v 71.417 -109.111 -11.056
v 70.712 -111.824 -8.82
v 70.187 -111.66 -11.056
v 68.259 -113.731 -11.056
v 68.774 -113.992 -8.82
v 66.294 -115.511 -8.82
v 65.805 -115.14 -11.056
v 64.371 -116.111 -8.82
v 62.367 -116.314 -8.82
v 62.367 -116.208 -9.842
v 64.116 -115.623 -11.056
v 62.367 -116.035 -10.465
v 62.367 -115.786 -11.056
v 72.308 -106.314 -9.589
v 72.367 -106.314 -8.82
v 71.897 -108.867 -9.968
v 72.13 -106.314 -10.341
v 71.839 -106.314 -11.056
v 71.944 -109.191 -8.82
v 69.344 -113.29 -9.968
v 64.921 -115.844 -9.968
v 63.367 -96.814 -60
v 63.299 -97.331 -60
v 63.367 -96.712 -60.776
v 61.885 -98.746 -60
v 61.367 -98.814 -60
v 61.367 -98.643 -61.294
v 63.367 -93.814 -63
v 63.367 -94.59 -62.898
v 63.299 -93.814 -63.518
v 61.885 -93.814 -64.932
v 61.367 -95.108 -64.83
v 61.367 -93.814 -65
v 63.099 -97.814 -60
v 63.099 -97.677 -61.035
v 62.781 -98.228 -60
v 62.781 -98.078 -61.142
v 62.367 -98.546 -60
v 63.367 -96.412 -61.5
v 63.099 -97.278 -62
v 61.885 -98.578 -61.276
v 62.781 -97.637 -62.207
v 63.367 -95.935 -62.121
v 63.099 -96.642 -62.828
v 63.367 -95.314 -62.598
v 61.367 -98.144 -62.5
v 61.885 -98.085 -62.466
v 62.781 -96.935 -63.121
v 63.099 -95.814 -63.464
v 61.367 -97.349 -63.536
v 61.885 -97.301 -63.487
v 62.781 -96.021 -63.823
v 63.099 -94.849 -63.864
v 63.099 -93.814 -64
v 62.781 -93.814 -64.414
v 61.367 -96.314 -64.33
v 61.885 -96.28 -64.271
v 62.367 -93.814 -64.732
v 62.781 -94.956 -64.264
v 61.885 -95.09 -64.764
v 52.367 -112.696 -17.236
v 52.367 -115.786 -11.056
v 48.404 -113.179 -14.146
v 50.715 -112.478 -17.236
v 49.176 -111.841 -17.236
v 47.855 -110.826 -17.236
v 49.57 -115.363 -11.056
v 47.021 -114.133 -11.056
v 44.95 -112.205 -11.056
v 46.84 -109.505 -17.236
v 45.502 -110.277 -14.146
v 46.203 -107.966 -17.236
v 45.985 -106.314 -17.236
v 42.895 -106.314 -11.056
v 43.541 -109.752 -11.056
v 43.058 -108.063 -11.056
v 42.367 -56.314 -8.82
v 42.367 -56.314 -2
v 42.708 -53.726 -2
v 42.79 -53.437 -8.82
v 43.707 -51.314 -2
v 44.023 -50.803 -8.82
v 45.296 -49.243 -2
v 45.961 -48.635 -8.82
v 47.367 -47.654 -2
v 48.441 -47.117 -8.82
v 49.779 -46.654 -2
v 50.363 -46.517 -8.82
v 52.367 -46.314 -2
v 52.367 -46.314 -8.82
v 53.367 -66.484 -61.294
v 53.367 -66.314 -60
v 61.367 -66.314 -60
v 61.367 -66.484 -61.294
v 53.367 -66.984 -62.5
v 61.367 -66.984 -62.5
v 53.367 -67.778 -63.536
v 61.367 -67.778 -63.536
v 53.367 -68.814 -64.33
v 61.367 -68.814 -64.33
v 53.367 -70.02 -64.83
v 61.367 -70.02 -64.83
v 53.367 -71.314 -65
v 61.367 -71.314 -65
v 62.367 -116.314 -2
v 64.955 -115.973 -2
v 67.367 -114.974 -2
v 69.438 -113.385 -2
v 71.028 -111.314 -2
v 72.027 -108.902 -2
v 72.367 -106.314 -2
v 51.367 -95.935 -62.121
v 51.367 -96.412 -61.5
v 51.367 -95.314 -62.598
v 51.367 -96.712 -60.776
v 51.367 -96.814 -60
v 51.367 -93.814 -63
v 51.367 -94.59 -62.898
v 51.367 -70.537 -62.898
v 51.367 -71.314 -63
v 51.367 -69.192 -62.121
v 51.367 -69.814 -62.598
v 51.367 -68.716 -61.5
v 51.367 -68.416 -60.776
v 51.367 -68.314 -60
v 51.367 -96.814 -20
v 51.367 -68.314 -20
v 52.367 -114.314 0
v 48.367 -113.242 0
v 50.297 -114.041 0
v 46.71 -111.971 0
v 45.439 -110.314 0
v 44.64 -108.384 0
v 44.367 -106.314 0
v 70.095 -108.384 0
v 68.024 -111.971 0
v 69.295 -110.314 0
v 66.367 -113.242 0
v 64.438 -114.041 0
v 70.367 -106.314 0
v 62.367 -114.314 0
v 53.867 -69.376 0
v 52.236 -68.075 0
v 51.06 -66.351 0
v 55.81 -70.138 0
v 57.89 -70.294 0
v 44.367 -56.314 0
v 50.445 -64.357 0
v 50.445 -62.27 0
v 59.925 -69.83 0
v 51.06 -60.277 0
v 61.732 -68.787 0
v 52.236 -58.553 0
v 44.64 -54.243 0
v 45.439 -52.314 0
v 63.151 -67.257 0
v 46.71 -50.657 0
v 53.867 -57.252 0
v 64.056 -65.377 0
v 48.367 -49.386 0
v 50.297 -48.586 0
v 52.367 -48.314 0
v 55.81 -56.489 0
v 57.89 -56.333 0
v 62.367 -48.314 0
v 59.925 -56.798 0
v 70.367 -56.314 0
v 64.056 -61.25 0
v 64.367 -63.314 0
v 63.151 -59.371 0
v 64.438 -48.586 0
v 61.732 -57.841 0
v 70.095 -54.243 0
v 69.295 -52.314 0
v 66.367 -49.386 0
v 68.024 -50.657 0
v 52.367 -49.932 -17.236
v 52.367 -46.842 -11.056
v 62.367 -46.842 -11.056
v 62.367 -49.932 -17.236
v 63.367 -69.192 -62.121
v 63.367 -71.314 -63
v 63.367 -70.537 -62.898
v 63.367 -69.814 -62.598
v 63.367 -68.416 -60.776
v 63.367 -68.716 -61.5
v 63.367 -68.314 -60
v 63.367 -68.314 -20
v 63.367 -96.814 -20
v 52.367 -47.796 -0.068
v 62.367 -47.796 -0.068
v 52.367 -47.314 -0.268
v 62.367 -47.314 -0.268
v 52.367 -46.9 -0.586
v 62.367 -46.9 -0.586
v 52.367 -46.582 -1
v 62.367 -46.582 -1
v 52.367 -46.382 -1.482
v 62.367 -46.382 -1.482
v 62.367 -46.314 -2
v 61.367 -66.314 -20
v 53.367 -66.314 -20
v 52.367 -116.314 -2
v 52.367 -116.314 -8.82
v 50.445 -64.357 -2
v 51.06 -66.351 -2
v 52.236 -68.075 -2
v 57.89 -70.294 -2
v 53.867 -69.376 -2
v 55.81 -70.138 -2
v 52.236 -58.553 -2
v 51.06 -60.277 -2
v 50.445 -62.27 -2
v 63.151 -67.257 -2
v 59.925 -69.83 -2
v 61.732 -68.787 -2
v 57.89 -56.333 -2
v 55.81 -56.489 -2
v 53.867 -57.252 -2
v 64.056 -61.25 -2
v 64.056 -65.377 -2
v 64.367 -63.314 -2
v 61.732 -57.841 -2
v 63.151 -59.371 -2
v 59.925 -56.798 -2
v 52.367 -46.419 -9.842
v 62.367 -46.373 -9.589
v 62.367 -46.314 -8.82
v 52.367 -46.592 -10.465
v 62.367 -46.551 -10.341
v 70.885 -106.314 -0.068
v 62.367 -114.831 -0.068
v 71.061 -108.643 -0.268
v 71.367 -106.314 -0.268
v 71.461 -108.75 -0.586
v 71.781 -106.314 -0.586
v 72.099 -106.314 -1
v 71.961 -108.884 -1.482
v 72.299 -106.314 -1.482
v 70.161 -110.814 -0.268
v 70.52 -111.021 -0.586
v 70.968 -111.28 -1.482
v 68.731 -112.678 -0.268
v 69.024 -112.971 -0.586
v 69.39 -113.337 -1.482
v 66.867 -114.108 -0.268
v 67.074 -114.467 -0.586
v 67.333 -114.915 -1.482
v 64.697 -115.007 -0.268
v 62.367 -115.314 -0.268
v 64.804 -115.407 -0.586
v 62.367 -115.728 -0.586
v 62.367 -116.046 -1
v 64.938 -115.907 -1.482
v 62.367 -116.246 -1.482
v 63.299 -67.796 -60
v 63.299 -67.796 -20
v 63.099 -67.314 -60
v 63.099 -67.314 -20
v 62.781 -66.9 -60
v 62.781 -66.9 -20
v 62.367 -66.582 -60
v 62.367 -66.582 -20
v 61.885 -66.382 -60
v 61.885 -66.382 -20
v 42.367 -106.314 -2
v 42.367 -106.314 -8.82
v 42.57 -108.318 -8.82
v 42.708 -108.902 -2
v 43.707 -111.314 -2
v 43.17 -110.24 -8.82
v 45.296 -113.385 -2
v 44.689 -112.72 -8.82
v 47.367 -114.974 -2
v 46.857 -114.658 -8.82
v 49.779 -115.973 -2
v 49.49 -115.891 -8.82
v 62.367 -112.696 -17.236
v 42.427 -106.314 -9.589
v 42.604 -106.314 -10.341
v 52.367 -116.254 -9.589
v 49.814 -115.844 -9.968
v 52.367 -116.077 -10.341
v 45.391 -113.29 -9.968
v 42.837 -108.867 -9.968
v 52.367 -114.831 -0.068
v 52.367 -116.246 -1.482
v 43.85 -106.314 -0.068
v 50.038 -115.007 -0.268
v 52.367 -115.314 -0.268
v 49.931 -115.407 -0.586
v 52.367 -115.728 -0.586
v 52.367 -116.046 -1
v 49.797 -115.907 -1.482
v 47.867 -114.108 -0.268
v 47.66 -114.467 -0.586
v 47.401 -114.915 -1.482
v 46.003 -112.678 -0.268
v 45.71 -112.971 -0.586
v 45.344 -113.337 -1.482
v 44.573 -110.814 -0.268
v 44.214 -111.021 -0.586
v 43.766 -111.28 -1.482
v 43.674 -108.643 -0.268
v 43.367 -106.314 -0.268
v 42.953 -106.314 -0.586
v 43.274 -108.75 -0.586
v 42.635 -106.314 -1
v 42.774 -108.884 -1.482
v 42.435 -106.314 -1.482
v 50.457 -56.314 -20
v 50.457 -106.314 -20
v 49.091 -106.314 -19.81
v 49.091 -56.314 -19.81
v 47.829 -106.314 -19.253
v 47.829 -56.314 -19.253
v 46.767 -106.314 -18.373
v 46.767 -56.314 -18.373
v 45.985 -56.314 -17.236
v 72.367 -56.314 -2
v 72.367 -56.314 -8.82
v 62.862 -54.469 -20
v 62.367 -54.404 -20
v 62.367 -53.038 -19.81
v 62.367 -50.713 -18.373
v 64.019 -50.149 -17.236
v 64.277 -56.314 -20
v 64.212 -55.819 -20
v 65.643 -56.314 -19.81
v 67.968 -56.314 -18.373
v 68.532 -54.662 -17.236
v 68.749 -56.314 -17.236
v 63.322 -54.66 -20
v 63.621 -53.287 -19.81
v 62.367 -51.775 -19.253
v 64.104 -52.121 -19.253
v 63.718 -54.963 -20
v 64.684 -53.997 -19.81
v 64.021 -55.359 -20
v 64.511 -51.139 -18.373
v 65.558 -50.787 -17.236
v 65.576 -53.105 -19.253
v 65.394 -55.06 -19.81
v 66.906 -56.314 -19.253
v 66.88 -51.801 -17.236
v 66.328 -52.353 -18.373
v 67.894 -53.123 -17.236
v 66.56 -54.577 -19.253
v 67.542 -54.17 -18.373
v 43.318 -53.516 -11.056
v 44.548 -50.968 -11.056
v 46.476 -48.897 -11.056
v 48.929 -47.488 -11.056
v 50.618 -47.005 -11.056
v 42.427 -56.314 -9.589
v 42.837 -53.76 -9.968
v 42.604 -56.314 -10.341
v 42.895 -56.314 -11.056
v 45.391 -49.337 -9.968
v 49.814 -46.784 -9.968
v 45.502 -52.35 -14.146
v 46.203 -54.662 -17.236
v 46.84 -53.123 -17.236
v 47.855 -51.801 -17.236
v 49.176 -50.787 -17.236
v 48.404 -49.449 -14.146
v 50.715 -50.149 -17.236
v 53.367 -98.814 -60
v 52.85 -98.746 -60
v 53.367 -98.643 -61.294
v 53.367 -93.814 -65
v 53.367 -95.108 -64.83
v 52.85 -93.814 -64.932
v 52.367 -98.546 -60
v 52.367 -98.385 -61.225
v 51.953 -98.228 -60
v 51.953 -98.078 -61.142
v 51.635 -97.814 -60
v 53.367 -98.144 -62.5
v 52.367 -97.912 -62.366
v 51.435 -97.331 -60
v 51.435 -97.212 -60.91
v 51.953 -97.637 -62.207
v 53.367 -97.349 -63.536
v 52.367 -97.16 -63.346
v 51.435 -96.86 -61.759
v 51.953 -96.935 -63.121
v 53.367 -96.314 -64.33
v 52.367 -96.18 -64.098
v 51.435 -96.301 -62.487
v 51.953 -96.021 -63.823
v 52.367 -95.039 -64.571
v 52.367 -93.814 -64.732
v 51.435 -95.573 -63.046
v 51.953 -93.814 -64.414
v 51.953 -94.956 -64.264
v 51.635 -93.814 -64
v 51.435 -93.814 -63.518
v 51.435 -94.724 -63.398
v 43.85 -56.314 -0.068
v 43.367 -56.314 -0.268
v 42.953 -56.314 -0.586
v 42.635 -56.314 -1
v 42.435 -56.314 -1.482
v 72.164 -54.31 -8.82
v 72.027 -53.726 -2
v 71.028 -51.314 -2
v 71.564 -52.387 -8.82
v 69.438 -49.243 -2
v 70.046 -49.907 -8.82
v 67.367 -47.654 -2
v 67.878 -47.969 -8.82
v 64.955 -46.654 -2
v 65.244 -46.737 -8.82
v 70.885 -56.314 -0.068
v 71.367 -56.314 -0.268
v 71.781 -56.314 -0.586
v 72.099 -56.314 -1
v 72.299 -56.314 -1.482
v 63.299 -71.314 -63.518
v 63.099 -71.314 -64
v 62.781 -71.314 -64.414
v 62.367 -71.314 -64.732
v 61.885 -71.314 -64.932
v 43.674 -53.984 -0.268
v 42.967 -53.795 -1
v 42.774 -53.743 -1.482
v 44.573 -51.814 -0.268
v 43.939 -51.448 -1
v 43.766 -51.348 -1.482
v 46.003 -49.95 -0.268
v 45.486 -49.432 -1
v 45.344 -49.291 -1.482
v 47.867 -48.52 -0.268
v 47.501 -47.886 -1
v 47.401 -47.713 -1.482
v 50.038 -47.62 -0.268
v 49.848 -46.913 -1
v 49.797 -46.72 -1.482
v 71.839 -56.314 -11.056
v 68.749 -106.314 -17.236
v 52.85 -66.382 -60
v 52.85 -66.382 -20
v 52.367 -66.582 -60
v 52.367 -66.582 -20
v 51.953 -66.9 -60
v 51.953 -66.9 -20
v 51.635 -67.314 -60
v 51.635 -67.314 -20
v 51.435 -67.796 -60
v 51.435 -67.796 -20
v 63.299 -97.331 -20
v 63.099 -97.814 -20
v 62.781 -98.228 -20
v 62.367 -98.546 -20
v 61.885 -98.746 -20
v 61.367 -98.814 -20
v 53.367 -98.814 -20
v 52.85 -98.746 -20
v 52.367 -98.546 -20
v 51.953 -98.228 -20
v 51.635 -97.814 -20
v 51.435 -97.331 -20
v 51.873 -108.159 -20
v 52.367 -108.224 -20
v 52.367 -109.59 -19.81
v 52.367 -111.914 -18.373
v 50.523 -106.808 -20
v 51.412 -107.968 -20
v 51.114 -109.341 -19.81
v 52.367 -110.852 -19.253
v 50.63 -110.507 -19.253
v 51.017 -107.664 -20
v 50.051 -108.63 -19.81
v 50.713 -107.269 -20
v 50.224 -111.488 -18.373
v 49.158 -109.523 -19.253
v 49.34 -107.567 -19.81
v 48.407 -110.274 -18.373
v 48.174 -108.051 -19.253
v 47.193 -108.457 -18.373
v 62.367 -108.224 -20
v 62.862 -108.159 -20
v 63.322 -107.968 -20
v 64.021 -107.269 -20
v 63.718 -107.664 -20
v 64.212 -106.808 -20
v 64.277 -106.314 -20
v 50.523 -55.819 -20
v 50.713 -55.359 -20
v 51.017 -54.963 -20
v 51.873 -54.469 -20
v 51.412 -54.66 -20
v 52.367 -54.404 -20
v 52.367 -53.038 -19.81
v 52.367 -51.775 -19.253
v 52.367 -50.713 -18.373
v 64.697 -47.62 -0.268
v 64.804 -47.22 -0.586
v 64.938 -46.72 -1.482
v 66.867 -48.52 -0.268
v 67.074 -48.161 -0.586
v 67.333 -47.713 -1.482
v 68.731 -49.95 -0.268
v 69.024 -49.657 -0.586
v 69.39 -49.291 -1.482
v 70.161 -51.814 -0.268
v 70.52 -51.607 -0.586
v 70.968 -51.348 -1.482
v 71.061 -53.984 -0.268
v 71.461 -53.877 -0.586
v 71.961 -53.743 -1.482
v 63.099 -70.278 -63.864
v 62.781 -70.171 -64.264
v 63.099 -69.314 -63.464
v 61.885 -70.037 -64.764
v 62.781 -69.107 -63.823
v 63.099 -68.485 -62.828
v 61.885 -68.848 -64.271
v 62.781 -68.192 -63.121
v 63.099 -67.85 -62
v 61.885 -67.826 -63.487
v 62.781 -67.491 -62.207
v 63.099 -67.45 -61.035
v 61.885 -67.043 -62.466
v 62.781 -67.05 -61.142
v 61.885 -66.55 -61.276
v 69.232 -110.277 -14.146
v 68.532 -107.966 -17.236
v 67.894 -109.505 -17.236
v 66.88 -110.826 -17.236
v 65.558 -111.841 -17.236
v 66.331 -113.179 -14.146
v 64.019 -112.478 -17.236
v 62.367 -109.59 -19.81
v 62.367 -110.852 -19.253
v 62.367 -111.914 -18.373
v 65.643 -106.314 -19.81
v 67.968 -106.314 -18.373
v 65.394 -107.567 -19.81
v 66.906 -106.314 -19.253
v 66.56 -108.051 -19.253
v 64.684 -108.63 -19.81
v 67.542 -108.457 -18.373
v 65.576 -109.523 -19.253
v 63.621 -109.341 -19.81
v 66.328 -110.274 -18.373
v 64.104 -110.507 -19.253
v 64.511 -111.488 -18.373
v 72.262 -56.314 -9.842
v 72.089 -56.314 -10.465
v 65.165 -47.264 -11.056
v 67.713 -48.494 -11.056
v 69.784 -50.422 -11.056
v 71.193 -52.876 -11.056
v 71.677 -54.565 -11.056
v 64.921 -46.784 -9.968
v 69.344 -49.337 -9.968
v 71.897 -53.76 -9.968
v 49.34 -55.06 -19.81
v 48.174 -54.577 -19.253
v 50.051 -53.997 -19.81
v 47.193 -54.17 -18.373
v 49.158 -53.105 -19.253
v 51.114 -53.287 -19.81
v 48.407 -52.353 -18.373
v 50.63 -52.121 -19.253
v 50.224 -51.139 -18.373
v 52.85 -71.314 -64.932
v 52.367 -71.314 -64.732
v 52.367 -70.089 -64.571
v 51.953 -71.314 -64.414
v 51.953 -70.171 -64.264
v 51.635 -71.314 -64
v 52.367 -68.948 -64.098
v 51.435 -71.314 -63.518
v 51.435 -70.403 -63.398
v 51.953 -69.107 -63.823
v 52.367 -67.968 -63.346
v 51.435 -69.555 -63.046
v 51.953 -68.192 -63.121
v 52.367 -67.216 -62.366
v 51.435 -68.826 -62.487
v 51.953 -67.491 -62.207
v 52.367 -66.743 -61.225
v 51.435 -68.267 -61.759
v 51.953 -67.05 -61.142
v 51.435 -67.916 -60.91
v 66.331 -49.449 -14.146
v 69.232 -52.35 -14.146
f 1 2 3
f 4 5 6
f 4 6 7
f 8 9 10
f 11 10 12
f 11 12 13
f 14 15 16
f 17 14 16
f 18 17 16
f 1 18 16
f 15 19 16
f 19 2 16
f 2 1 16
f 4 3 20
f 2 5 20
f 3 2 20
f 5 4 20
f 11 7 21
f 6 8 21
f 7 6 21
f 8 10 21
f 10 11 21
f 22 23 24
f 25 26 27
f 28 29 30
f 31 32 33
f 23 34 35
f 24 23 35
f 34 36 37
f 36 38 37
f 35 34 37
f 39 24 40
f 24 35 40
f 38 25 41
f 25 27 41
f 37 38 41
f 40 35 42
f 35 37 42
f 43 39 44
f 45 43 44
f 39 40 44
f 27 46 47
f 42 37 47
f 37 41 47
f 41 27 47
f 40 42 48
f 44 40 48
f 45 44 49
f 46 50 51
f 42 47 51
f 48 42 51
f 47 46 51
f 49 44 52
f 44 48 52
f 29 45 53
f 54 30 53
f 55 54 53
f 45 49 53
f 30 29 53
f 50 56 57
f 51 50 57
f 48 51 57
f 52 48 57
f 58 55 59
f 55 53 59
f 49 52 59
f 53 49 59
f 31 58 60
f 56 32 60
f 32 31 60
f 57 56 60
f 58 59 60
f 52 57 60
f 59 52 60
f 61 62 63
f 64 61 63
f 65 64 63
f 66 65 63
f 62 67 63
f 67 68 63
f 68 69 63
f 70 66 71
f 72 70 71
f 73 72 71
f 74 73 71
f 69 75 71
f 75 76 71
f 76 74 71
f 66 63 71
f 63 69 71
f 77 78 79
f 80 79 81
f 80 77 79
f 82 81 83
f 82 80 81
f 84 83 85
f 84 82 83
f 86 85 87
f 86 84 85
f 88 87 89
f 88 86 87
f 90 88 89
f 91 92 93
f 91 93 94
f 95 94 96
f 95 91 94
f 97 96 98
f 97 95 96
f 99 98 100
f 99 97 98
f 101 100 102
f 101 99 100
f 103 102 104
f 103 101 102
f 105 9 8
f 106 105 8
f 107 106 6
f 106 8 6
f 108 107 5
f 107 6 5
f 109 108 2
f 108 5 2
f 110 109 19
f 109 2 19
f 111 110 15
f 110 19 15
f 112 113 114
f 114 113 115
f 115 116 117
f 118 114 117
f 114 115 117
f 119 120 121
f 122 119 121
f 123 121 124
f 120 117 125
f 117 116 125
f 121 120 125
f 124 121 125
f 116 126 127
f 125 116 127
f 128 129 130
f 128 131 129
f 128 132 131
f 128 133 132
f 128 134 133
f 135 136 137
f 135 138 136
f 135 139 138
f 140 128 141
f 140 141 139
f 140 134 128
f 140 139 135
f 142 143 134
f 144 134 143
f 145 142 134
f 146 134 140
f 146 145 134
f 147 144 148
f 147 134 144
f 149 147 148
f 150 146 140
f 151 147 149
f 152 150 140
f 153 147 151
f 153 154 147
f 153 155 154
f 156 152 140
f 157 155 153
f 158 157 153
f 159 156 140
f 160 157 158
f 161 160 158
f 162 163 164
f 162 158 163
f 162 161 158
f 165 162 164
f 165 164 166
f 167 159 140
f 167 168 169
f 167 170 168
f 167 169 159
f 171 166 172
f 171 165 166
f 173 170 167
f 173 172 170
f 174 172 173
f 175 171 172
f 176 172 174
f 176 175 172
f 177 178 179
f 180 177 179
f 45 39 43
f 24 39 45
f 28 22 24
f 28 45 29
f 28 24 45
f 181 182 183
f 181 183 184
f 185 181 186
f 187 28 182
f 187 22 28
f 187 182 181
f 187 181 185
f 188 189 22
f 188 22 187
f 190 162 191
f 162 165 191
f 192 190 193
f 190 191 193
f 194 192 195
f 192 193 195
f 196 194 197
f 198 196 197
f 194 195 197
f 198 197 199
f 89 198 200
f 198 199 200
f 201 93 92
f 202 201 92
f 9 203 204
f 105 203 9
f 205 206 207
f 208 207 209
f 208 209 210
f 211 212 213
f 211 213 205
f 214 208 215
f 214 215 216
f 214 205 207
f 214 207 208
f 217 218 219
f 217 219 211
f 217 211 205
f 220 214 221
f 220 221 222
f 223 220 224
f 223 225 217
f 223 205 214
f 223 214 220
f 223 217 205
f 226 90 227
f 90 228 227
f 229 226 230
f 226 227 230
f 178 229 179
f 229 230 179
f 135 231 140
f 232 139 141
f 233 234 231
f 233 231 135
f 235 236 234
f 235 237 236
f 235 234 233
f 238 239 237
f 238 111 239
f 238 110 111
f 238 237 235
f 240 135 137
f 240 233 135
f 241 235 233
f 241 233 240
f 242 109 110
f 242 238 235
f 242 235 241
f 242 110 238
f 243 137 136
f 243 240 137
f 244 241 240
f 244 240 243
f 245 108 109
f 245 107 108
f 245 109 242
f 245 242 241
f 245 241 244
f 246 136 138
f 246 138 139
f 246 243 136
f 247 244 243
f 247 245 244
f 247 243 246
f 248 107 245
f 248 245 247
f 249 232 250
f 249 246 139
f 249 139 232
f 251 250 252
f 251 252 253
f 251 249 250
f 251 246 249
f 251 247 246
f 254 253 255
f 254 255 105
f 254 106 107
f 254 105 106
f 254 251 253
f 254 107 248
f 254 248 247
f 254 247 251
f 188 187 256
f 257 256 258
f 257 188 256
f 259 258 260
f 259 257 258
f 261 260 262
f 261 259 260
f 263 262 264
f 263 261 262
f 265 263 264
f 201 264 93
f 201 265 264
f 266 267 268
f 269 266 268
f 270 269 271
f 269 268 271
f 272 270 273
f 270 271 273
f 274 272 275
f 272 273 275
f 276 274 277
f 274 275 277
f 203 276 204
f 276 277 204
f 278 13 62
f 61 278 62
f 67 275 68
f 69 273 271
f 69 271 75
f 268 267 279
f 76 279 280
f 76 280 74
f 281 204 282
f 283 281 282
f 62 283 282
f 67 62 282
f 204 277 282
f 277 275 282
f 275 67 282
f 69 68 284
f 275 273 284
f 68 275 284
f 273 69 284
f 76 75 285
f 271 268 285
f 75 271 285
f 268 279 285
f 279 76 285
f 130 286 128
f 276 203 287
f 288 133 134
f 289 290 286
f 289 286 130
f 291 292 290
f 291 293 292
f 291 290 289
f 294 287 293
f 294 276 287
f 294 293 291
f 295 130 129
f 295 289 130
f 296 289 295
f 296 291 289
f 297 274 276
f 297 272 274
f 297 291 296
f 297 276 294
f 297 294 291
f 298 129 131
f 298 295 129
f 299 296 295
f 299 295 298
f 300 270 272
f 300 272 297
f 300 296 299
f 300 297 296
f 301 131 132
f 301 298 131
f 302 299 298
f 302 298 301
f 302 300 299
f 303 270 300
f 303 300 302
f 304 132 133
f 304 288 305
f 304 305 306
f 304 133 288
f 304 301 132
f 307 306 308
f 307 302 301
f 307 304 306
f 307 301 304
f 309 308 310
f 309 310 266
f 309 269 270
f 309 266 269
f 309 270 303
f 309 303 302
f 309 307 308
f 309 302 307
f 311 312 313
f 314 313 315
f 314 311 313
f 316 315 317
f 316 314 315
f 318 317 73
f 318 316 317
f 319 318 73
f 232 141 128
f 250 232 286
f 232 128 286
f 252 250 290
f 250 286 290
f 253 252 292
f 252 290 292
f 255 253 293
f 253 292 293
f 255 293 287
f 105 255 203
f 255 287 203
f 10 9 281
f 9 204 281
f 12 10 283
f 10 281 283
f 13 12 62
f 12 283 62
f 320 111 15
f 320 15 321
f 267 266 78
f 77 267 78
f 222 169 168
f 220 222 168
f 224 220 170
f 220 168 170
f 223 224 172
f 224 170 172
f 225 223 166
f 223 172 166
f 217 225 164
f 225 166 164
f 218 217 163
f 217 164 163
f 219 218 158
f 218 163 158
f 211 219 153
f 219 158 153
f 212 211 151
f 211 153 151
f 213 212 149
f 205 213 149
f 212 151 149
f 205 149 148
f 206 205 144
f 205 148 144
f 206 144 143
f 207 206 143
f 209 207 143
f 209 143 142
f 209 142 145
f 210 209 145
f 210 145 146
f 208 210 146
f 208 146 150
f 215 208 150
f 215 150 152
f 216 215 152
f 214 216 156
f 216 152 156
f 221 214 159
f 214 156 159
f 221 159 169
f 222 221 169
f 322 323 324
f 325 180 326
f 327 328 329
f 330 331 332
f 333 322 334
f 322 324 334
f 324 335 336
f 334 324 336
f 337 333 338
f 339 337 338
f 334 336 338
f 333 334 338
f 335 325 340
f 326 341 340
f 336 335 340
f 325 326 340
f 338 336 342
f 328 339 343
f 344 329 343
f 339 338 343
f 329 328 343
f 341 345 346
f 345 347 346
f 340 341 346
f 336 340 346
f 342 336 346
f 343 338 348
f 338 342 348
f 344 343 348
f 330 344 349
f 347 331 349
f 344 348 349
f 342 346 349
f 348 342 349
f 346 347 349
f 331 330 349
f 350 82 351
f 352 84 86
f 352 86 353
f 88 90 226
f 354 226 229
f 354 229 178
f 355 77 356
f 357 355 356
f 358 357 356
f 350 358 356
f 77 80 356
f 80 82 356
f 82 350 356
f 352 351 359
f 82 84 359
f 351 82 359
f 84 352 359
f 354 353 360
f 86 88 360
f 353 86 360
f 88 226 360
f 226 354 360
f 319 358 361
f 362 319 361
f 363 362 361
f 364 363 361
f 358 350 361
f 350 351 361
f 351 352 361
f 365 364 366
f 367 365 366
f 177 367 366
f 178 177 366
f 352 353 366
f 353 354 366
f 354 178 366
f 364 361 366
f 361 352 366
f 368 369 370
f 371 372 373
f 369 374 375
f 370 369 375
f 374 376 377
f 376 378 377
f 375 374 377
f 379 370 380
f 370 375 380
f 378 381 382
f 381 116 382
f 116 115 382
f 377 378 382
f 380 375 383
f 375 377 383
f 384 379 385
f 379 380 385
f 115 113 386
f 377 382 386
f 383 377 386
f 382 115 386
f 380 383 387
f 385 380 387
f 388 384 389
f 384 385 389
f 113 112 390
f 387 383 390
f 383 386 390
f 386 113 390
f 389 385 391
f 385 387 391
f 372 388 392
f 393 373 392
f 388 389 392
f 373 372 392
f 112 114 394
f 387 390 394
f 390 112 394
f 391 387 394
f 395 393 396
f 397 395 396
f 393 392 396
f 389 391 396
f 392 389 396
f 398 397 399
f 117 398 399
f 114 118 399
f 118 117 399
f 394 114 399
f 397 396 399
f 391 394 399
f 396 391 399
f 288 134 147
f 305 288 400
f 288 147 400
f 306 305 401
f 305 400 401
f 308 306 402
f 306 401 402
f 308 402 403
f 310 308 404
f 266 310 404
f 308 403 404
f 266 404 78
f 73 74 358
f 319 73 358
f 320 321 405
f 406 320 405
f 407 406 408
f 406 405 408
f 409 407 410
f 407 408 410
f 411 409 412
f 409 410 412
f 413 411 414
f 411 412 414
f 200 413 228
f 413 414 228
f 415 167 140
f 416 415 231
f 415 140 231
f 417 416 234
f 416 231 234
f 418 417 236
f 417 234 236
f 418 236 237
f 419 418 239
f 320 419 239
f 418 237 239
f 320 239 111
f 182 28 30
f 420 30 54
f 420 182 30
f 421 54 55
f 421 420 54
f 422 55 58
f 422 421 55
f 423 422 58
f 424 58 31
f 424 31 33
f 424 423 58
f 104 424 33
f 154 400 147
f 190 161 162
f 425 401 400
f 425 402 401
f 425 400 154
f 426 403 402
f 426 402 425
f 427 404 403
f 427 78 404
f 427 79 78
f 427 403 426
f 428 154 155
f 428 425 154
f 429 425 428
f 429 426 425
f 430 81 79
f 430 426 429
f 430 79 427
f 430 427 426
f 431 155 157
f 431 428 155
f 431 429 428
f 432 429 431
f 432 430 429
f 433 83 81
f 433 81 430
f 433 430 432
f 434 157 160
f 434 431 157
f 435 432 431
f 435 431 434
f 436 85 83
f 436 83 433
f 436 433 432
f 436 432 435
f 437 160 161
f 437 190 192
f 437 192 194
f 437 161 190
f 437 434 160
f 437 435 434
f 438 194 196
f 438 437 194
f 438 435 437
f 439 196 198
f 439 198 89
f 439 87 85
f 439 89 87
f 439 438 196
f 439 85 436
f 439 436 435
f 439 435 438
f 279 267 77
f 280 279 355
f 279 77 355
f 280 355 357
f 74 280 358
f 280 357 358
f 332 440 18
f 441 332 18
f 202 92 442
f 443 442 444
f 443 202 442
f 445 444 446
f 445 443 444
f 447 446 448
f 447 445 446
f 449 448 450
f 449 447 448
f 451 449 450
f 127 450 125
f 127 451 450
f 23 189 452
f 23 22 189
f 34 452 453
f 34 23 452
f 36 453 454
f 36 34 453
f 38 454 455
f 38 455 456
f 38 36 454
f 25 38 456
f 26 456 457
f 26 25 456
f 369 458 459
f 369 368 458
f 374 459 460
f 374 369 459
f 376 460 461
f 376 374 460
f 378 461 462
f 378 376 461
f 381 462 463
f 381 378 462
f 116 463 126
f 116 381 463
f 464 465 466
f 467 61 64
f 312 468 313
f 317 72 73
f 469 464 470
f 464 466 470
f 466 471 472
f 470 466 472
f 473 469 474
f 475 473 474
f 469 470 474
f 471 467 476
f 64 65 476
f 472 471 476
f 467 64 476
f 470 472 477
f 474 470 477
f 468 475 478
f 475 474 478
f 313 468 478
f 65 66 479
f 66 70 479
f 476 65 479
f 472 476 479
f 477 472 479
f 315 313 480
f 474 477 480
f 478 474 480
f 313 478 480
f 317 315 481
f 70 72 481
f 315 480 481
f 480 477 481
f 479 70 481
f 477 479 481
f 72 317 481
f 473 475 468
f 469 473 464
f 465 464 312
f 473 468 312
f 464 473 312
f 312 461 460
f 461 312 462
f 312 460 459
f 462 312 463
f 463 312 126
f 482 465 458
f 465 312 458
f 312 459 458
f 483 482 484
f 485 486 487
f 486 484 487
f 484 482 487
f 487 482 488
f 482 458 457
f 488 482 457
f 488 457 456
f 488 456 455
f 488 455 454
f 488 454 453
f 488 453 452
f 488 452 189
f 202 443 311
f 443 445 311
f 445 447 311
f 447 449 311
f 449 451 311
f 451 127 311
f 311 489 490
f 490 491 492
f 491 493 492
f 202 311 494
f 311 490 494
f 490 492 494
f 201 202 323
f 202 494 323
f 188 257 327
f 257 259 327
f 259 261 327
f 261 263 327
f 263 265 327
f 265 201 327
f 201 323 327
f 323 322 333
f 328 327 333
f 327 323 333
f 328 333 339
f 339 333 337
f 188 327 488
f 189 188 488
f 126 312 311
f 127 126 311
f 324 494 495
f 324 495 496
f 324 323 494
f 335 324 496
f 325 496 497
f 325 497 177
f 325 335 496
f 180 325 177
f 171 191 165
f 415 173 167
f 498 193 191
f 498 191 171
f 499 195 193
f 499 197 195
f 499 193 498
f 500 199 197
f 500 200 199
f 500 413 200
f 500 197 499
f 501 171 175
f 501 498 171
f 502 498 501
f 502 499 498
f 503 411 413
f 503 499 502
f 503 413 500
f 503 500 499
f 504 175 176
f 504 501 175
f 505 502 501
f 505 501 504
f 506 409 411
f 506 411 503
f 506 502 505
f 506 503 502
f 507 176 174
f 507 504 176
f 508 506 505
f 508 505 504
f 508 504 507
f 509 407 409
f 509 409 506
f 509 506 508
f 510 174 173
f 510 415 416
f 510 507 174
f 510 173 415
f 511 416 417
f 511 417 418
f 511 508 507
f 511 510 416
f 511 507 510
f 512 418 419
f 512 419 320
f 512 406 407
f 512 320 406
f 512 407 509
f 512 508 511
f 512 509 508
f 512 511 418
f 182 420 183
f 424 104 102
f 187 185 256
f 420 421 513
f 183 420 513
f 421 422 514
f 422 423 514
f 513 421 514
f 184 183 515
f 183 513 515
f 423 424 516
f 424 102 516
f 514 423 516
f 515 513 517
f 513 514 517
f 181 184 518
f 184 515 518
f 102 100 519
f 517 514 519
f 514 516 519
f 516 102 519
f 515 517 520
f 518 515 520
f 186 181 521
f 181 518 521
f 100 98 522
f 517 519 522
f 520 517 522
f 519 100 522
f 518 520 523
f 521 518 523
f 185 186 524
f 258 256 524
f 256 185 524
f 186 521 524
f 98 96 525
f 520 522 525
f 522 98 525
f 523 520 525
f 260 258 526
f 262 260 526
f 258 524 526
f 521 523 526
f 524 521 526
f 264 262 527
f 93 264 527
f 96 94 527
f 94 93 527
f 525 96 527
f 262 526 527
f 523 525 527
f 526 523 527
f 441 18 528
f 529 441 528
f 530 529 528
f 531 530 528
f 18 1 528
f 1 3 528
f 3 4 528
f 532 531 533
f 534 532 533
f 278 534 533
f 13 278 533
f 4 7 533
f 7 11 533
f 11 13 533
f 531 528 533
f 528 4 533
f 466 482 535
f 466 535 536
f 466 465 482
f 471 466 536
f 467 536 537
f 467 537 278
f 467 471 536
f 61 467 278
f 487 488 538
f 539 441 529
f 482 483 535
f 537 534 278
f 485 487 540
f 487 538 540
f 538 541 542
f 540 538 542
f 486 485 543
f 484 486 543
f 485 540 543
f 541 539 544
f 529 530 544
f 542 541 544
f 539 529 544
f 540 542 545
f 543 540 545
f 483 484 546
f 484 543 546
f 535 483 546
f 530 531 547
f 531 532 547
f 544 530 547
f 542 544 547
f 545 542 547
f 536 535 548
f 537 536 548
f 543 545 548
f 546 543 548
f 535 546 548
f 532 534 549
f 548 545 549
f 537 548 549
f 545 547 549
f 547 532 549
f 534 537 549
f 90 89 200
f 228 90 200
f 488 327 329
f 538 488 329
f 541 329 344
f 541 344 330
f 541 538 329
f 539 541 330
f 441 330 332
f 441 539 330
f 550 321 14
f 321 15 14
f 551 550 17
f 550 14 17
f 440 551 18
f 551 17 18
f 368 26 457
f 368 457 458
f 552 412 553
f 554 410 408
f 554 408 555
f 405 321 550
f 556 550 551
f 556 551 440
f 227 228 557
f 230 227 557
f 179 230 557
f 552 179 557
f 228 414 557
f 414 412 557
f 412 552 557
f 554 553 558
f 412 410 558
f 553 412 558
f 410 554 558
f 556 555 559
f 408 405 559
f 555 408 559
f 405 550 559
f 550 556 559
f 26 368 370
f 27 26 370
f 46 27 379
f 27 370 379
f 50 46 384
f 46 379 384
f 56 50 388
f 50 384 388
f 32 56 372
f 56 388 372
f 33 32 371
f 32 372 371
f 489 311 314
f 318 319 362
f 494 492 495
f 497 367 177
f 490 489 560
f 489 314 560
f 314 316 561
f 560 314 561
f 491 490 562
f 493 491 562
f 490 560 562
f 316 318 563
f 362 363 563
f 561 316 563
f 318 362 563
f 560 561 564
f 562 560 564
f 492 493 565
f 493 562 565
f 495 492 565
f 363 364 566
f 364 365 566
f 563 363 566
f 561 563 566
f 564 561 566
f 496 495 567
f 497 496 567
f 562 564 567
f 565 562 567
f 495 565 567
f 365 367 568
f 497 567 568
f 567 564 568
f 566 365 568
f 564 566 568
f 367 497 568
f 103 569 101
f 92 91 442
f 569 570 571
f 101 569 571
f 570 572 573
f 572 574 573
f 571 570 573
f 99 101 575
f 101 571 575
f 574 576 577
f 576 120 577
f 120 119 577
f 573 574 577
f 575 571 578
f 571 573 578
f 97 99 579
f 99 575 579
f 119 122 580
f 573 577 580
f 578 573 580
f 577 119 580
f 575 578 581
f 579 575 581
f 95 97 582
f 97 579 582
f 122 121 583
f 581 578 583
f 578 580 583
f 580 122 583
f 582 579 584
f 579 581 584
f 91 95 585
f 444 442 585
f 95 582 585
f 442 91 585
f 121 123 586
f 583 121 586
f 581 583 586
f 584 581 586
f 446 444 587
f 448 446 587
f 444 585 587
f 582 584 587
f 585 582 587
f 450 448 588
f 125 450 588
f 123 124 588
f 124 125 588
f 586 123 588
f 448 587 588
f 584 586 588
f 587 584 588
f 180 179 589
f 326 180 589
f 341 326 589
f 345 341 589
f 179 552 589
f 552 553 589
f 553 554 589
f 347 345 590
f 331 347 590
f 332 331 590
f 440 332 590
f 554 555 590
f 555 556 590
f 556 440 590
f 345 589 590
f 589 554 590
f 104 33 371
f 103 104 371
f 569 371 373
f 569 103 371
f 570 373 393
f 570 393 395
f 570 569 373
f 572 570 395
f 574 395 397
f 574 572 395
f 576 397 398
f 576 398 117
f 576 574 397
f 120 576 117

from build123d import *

# Parameters (mm, degrees)
SKETCH1_W           = 30
SKETCH1_H           = 70
BOSS_EXTRUDE1_DEPTH = 20
FILLET1_R           = 10
FILLET2_R           = 2
CHAMFER1_SIZE       = 5
CHAMFER1_SIZE2      = 10
FILLET3_R           = 5
SKETCH2_W           = 12
SKETCH2_H           = 32.5
BOSS_EXTRUDE2_DEPTH = 45
FILLET4_R           = 5
SKETCH3_R           = 7
CUT_EXTRUDE1_DEPTH  = 2
FILLET5_R           = 2


with BuildPart() as part:
    # Sketch1 → Boss-Extrude1 (new body)
    with BuildSketch(Plane.XY):
        with Locations((57.367254616, -81.313756287)):
            Rectangle(SKETCH1_W, SKETCH1_H)
    extrude(amount=-BOSS_EXTRUDE1_DEPTH)

    # Fillet1
    fillet1_edges = [part.edges().sort_by_distance(p)[0] for p in [
        (42.367254616, -46.313756287, -10),
        (72.367254616, -46.313756287, -10),
        (72.367254616, -116.313756287, -10),
        (42.367254616, -116.313756287, -10),
    ]]
    fillet(fillet1_edges, radius=FILLET1_R)

    # Fillet2
    fillet2_edges = [part.edges().sort_by_distance(p)[0] for p in [
        (57.367254616, -46.313756287, 0),
        (42.367254616, -81.313756287, 0),
        (57.367254616, -116.313756287, 0),
        (72.367254616, -81.313756287, 0),
        (69.438322428, -113.384824099, 0),
        (45.296186805, -113.384824099, 0),
        (69.438322428, -49.242688475, 0),
        (45.296186805, -49.242688475, 0),
    ]]
    fillet(fillet2_edges, radius=FILLET2_R)

    # Chamfer1
    chamfer1_edges = [part.edges().sort_by_distance(p)[0] for p in [
        (57.367254616, -46.313756287, -20),
        (42.367254616, -81.313756287, -20),
        (72.367254616, -81.313756287, -20),
        (57.367254616, -116.313756287, -20),
        (69.438322428, -113.384824099, -20),
        (45.296186805, -113.384824099, -20),
        (69.438322428, -49.242688475, -20),
        (45.296186805, -49.242688475, -20),
    ]]
    chamfer1_side = [part.faces().sort_by_distance(p)[0] for p in [
        (57.367254616, -81.313756287, -20),
    ]]
    chamfer(chamfer1_edges, length=CHAMFER1_SIZE, length2=CHAMFER1_SIZE2, reference=chamfer1_side[0])

    # Fillet3
    fillet3_edges = [part.edges().sort_by_distance(p)[0] for p in [
        (42.367254616, -81.313756287, -10),
        (67.367254616, -81.313756287, -20),
        (65.902788522, -52.778222381, -20),
        (65.902788522, -109.849290193, -20),
        (57.367254616, -51.313756287, -20),
        (57.367254616, -111.313756287, -20),
        (48.83172071, -52.778222381, -20),
        (48.83172071, -109.849290193, -20),
        (47.367254616, -81.313756287, -20),
        (45.296186805, -113.384824099, -10),
        (45.296186805, -49.242688475, -10),
        (57.367254616, -116.313756287, -10),
        (57.367254616, -46.313756287, -10),
        (69.438322428, -113.384824099, -10),
        (69.438322428, -49.242688475, -10),
        (72.367254616, -81.313756287, -10),
    ]]
    fillet(fillet3_edges, radius=FILLET3_R)

    # Sketch2 → Boss-Extrude2 (add)
    with BuildSketch(Plane(origin=(0, 0, -20), x_dir=(-1, 0, 0), z_dir=(0, 0, -1))):
        with Locations((-57.367254616, -82.563756287)):
            Rectangle(SKETCH2_W, SKETCH2_H)
    extrude(amount=BOSS_EXTRUDE2_DEPTH)

    # Fillet4
    fillet4_edges = [part.edges().sort_by_distance(p)[0] for p in [
        (57.367254616, -98.813756287, -65),
        (57.367254616, -66.313756287, -65),
    ]]
    fillet(fillet4_edges, radius=FILLET4_R)

    # Sketch3 → Cut-Extrude1 (cut)
    with BuildSketch(Plane.XY):
        with Locations((57.367254616, -63.313756287)):
            Circle(SKETCH3_R)
    extrude(amount=-CUT_EXTRUDE1_DEPTH, mode=Mode.SUBTRACT)

    # Fillet5
    fillet5_edges = [part.edges().sort_by_distance(p)[0] for p in [
        (63.367254616, -82.563756287, -65),
        (51.367254616, -82.563756287, -65),
        (63.367254616, -98.813756287, -40),
        (63.367254616, -66.313756287, -40),
        (63.367254616, -97.349290193, -63.535533906),
        (63.367254616, -67.778222381, -63.535533906),
        (51.367254616, -66.313756287, -40),
        (51.367254616, -98.813756287, -40),
        (51.367254616, -97.349290193, -63.535533906),
        (51.367254616, -67.778222381, -63.535533906),
    ]]
    fillet(fillet5_edges, radius=FILLET5_R)


solid = part.part
